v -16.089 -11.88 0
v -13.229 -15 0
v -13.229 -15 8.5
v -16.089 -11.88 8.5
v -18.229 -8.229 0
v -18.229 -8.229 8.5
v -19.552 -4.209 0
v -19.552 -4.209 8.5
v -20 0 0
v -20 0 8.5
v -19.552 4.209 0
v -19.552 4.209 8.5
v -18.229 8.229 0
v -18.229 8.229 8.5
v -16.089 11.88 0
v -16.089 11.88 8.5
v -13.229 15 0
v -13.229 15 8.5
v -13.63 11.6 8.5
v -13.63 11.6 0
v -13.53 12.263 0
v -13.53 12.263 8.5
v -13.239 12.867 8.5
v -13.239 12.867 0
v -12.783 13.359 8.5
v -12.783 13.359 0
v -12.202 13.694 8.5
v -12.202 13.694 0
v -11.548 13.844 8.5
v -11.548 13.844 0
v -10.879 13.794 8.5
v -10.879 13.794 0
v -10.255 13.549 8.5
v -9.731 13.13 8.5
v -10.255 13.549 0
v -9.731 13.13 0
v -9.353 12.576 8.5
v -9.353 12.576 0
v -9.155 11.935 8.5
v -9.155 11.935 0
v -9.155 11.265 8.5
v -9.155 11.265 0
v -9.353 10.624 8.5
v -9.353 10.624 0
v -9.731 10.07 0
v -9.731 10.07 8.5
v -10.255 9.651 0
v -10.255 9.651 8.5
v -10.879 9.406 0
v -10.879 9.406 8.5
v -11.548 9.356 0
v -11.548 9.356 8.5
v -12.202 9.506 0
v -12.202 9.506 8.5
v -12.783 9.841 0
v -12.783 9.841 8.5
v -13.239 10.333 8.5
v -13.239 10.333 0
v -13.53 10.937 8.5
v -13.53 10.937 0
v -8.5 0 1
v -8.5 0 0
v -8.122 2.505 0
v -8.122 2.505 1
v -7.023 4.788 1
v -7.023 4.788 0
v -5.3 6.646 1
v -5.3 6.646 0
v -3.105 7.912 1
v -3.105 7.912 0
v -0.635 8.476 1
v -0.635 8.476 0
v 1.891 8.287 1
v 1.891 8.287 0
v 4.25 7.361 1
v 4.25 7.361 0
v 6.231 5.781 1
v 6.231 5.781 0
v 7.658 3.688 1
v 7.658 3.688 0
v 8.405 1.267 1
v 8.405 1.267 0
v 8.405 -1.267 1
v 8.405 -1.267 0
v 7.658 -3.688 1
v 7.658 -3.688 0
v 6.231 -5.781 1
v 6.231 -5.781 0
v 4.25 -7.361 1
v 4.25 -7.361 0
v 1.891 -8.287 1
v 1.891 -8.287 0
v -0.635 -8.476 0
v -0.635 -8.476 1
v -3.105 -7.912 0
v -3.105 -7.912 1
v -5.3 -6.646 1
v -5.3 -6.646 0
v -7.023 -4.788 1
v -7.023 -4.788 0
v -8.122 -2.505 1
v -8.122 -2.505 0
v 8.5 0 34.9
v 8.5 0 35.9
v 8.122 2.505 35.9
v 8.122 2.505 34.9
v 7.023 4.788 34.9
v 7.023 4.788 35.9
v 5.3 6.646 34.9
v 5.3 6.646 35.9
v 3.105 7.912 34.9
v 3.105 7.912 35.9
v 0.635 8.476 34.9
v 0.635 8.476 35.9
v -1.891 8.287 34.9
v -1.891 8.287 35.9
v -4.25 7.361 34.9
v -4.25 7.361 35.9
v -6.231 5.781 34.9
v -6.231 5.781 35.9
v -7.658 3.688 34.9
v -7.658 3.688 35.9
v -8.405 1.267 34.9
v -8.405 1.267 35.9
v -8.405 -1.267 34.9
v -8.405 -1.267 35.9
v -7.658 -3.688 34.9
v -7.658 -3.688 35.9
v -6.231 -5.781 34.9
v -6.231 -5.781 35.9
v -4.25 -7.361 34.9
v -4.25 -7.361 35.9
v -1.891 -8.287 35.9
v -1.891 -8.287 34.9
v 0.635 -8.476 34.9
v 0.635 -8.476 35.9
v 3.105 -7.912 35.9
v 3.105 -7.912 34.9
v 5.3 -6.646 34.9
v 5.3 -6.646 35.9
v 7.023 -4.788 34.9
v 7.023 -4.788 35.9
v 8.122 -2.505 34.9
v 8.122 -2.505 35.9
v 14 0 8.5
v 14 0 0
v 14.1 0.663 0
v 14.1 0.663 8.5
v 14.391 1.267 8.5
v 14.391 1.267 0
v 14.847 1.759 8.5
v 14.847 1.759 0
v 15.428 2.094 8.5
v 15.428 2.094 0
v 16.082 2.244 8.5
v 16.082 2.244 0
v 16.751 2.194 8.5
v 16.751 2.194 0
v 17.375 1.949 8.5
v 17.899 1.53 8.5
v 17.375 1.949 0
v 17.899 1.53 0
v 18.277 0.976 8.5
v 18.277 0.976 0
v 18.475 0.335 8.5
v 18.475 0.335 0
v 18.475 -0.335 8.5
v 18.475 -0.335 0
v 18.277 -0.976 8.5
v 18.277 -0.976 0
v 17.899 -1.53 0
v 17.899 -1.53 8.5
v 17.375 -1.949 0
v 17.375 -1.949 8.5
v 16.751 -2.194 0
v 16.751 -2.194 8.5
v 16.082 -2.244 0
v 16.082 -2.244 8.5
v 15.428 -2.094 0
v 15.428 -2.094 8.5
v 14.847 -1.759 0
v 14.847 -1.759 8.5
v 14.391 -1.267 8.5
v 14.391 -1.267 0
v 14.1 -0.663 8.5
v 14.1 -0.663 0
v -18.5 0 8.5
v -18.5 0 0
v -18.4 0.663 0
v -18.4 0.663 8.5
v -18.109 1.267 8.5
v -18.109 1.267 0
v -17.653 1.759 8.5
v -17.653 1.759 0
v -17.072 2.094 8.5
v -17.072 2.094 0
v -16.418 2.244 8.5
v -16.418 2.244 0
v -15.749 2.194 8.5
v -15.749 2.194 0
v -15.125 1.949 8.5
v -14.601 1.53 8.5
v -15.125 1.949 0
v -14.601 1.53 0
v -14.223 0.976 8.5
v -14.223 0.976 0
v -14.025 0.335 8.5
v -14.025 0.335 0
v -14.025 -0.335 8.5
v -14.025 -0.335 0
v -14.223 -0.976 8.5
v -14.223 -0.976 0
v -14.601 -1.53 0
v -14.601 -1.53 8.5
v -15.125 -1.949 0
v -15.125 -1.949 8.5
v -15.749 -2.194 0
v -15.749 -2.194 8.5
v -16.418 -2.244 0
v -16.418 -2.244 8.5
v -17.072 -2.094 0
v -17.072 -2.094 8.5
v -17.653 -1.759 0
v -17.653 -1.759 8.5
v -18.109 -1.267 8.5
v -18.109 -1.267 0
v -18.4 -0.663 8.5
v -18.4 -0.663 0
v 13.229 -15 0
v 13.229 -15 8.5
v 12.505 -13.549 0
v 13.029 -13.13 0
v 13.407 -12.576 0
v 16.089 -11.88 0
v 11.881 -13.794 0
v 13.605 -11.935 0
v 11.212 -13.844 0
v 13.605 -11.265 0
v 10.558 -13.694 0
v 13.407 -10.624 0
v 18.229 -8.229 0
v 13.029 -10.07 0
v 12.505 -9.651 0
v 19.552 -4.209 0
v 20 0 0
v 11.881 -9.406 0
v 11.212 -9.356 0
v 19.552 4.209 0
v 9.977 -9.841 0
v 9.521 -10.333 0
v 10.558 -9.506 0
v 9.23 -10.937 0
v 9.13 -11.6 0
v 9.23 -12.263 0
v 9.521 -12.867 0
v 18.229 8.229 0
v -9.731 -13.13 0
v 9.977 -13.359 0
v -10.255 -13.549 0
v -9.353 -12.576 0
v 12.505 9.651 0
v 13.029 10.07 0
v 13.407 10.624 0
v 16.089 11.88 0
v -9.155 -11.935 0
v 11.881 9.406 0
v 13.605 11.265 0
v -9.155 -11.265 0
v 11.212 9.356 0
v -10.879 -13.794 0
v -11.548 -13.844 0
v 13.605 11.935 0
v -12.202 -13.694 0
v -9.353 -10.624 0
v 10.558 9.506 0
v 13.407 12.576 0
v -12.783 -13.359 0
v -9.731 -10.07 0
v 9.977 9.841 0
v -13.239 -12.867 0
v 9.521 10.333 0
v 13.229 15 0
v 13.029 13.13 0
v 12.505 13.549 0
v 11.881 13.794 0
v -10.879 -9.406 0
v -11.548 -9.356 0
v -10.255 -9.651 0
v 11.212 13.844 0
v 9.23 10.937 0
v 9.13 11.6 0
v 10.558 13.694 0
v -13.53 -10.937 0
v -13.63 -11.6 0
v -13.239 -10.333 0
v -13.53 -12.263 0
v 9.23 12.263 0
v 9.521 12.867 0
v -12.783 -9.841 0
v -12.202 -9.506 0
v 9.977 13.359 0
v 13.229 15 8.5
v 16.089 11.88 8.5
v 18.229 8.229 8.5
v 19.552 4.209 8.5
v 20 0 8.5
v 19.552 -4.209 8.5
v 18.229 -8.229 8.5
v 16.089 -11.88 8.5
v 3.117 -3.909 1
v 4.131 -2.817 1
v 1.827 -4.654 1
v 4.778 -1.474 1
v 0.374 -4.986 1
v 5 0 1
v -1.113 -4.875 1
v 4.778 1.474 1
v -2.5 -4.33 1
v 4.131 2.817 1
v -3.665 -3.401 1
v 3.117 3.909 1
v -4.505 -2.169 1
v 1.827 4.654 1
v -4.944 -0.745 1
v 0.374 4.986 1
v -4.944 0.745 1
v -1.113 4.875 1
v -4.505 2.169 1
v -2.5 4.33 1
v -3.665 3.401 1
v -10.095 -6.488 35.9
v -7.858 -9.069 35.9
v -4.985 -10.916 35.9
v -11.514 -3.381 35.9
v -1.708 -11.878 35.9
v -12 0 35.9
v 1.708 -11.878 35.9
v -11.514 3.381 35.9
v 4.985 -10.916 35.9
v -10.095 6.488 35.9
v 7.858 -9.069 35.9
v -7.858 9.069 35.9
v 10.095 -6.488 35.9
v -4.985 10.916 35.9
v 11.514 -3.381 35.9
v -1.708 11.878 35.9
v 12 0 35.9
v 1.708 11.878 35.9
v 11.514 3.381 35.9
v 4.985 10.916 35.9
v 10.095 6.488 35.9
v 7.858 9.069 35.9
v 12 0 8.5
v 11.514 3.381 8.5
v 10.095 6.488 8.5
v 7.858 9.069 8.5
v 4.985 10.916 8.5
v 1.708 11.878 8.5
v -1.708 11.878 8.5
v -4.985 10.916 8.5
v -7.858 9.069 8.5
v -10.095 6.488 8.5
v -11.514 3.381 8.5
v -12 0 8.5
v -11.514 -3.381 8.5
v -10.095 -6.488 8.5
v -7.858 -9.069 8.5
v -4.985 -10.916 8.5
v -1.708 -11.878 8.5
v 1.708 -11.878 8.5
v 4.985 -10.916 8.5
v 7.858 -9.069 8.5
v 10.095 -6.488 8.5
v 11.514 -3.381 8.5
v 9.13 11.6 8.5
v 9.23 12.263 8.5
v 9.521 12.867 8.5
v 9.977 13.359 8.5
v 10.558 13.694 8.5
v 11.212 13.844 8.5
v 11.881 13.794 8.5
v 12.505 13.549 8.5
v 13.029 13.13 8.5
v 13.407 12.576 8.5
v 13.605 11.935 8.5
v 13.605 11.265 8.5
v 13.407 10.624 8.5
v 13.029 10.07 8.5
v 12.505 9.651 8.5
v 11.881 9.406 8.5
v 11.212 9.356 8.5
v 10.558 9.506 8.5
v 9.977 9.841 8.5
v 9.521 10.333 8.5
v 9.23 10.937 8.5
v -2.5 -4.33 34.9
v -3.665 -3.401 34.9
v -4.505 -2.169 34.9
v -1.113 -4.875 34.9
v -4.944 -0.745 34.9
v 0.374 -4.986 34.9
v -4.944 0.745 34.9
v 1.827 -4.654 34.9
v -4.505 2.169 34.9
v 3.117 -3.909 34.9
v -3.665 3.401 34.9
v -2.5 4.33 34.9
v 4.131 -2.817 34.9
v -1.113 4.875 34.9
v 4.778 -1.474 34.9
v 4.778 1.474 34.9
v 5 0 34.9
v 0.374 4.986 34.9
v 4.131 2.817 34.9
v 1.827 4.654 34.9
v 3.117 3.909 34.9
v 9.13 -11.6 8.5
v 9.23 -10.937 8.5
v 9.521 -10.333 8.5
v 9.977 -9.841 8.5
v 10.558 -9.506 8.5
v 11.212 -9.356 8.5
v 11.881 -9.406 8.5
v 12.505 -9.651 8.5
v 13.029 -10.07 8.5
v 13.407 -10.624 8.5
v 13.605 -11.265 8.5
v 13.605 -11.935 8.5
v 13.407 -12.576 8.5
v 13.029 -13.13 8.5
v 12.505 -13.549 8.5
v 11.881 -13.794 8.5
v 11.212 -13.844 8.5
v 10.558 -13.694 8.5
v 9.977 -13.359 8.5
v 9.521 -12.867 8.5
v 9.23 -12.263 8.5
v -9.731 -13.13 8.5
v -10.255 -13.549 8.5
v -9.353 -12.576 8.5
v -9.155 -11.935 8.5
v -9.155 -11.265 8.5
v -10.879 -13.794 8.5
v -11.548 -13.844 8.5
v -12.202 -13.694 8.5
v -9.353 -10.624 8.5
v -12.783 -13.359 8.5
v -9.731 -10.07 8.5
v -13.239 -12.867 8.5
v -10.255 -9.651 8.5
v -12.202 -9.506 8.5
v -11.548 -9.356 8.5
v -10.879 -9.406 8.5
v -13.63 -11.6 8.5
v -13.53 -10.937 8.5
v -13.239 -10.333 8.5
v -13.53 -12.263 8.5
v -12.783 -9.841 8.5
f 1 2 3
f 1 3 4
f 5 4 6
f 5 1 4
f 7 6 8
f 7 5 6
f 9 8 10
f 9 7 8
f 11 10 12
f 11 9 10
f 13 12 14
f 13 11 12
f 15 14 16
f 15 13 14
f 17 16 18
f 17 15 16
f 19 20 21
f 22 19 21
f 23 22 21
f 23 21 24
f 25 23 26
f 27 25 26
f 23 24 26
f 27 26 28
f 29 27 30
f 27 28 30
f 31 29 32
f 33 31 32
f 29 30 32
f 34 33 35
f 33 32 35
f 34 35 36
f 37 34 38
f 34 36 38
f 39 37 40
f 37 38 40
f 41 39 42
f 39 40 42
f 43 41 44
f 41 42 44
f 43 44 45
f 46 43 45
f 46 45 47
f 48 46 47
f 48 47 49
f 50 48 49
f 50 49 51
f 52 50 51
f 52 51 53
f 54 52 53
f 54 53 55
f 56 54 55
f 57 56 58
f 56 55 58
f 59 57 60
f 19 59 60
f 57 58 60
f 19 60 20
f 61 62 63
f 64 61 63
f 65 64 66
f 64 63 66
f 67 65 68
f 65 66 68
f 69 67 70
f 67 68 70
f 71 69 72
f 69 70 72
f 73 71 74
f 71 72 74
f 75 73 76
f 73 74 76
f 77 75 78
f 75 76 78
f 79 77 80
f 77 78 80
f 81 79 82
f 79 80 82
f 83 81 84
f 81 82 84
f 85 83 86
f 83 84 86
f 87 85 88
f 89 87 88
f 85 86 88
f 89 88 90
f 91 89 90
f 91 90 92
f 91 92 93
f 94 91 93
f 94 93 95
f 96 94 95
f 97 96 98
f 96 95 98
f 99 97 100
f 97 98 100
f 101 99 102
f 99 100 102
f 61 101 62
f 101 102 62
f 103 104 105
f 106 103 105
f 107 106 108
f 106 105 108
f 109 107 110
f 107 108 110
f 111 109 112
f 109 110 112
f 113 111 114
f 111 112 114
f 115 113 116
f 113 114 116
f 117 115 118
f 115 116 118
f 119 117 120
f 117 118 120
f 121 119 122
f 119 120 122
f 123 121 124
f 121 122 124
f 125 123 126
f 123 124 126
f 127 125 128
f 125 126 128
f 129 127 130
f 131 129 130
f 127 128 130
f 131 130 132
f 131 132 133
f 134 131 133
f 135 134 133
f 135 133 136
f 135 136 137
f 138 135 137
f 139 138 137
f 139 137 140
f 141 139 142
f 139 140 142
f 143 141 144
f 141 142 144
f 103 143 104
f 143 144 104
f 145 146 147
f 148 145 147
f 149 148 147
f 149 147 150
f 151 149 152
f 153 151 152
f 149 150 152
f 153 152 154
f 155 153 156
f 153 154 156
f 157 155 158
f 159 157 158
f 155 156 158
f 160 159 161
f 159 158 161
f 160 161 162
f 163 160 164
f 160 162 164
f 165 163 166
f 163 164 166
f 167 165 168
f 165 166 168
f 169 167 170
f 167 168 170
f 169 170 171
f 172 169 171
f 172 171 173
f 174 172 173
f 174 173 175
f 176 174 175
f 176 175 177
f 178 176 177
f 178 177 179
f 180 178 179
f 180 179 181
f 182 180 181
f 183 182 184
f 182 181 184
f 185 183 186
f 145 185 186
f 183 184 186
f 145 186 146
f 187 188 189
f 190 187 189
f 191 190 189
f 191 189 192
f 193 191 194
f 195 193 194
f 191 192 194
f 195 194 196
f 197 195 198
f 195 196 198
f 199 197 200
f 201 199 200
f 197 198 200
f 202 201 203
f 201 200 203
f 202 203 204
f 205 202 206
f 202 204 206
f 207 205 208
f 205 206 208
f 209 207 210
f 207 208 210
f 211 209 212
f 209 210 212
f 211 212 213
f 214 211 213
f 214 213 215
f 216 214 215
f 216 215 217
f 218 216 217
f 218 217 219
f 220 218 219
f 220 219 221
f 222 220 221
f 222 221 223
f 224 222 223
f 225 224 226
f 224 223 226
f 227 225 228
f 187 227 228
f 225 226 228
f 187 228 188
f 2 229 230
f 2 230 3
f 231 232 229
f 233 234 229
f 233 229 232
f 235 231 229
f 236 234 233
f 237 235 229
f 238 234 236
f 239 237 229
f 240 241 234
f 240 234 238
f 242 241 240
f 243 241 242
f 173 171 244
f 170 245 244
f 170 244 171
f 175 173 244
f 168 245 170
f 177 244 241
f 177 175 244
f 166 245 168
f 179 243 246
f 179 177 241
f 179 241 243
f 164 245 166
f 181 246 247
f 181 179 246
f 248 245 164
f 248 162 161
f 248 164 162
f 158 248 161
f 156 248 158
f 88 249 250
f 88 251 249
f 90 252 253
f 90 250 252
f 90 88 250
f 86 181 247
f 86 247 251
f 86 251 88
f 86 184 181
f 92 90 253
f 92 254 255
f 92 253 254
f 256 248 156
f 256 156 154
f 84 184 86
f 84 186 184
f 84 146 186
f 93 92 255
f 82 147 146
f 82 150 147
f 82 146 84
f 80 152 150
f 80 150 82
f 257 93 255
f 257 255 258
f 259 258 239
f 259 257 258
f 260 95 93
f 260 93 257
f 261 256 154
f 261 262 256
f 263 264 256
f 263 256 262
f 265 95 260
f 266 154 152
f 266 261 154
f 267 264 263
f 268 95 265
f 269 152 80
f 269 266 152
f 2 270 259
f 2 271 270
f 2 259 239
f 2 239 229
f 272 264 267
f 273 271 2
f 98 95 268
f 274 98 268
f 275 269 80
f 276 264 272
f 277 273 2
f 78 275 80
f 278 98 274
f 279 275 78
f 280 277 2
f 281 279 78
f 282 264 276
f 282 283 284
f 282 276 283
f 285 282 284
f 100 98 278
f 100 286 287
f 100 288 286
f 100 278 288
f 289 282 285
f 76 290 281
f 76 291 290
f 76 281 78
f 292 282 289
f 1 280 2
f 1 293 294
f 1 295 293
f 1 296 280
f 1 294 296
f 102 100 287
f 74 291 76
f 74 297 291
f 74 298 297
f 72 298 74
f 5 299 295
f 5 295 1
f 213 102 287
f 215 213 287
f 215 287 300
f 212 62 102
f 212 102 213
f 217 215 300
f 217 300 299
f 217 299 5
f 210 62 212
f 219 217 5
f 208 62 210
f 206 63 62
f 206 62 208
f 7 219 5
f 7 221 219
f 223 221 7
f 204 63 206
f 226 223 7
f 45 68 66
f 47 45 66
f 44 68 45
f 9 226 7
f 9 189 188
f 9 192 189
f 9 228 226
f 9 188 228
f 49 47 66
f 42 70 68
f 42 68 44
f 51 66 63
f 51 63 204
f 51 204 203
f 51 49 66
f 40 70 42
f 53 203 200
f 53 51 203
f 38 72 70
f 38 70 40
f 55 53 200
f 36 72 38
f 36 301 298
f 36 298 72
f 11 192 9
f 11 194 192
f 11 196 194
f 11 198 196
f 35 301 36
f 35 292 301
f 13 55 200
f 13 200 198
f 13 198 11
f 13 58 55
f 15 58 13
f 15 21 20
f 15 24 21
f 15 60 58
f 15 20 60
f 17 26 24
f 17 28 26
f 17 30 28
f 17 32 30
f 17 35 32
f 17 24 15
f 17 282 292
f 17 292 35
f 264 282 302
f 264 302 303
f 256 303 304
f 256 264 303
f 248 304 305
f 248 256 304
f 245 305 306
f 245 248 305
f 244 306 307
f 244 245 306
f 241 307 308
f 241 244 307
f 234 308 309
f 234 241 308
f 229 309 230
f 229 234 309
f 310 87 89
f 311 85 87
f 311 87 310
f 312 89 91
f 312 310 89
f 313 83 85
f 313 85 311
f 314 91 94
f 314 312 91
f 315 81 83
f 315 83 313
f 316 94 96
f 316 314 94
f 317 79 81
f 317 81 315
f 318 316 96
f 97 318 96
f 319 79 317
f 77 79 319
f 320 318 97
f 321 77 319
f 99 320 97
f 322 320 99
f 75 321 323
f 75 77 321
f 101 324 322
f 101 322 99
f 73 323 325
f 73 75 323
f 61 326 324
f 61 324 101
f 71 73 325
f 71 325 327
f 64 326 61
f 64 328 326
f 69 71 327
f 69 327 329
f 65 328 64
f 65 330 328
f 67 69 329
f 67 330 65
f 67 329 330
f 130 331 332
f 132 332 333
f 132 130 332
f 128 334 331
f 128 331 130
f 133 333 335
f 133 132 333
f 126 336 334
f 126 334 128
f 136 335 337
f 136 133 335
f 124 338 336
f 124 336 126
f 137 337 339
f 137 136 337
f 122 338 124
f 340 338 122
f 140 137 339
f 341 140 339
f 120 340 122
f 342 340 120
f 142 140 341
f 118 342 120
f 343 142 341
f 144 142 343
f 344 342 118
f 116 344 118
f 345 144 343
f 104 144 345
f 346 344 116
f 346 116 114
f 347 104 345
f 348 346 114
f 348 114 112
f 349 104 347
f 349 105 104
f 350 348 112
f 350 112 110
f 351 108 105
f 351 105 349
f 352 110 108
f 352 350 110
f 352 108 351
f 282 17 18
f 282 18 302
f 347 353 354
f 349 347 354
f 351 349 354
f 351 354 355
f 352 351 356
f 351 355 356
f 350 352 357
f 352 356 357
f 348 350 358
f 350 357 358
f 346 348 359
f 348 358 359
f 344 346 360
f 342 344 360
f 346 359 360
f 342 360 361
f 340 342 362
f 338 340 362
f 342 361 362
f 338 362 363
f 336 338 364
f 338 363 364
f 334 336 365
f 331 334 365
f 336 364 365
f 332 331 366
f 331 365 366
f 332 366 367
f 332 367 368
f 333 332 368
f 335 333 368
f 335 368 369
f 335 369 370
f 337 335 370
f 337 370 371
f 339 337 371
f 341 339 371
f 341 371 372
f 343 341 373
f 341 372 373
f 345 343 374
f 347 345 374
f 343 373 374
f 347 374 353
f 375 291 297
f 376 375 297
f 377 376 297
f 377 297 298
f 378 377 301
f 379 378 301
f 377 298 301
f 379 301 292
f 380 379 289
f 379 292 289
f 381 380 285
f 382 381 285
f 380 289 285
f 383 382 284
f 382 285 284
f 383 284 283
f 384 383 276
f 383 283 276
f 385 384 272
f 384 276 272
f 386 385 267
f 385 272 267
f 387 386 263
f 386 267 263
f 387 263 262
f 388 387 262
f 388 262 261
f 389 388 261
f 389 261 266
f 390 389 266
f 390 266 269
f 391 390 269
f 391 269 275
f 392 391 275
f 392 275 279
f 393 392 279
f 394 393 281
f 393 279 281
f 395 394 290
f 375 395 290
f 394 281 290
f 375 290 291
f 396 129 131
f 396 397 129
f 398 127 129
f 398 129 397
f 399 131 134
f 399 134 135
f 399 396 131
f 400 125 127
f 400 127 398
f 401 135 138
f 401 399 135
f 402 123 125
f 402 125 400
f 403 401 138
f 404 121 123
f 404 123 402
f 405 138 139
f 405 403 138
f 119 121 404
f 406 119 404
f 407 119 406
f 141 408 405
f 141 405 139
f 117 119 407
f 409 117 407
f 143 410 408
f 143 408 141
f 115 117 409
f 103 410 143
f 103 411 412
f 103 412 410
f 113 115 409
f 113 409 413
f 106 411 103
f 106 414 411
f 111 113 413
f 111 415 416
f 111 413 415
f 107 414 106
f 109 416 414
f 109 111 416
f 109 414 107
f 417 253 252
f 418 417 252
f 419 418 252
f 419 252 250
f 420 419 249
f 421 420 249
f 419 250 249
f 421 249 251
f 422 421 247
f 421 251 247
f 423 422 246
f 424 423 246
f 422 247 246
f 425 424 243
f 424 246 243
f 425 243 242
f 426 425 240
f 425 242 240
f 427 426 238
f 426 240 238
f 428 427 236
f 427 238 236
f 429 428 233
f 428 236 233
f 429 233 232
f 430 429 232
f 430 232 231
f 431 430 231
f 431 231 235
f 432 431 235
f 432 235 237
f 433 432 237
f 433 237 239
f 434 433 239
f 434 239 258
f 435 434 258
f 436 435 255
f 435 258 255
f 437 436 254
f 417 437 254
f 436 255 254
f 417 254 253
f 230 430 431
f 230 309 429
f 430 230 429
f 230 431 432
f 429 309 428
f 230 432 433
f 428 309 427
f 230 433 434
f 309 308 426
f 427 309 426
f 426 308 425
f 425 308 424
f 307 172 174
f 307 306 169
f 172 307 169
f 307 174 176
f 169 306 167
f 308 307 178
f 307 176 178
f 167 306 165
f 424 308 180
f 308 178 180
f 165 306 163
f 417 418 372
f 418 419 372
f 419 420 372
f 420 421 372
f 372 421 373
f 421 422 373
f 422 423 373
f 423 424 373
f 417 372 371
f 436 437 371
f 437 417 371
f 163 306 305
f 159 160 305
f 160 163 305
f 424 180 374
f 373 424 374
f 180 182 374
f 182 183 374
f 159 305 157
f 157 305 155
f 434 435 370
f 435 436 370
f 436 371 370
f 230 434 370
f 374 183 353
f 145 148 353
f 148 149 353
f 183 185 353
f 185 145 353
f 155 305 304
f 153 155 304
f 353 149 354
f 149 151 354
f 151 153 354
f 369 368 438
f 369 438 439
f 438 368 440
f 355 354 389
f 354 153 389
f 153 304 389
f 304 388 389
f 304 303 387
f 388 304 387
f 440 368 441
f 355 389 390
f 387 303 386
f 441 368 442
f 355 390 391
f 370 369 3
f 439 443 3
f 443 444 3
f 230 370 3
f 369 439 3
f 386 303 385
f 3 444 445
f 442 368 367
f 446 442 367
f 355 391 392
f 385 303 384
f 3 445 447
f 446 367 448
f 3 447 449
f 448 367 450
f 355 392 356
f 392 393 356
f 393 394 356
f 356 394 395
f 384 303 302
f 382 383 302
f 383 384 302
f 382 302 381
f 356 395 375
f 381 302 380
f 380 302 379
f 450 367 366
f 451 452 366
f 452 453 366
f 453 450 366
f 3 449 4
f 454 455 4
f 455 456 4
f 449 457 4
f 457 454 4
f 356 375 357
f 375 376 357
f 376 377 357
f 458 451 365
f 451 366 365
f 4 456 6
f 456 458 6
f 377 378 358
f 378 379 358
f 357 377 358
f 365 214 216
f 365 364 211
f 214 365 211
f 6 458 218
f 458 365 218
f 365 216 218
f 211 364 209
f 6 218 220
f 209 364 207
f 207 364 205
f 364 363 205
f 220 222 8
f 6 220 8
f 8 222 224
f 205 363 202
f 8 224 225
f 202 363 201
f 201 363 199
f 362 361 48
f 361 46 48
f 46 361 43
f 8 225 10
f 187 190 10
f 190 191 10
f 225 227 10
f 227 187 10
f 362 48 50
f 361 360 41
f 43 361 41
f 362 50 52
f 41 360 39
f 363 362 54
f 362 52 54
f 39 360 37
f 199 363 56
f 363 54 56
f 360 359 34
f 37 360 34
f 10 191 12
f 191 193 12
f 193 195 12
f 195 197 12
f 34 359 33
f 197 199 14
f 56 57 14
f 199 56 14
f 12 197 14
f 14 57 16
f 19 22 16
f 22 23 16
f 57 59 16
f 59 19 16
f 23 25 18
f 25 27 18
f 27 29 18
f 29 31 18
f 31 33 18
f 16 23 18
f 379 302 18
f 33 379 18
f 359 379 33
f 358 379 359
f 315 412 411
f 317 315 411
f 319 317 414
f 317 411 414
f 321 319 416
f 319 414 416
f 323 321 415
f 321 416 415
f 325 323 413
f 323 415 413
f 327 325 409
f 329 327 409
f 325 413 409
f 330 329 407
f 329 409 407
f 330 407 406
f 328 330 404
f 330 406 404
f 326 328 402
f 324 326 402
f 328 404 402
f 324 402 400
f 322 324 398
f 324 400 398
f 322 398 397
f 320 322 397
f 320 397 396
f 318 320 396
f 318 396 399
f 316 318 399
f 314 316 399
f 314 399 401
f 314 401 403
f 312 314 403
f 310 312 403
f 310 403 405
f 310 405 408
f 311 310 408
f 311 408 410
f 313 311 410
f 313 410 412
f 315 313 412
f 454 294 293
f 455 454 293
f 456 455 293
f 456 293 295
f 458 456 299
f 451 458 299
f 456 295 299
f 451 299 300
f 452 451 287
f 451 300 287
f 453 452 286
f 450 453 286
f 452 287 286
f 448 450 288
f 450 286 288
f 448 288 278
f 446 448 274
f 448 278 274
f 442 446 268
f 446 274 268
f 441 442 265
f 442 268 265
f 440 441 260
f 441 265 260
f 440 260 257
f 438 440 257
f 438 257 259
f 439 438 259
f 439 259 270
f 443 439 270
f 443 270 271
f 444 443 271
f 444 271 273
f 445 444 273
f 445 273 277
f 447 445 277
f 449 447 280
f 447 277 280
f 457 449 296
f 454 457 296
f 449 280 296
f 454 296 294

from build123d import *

# Parameters (mm, degrees)
SALIENTE_EXTRUIR1_DEPTH = 8.5
CROQUIS2_R              = 12
SALIENTE_EXTRUIR2_DEPTH = 27.4
CROQUIS3_R              = 5
CORTAR_EXTRUIR1_DEPTH   = 35.9
CROQUIS4_R              = 8.5
CORTAR_EXTRUIR2_DEPTH   = 1
CROQUIS5_R              = 8.5
CORTAR_EXTRUIR3_DEPTH   = 1
CROQUIS6_R              = 2.25
CORTAR_EXTRUIR4_DEPTH   = 8.5


with BuildPart() as part:
    # Croquis1 → Saliente-Extruir1 (new body)
    with BuildSketch(Plane.XY):
        with BuildLine():
            Line((-13.228756555, 15), (13.228756555, 15))
            ThreePointArc((13.228756555, 15), (20, 0), (13.228756555, -15))
            Line((13.228756555, -15), (-13.228756555, -15))
            ThreePointArc((-13.228756555, -15), (-20, 0), (-13.228756555, 15))
        make_face()
    extrude(amount=SALIENTE_EXTRUIR1_DEPTH)

    # Croquis2 → Saliente-Extruir2 (add)
    with BuildSketch(Plane.XY.offset(8.5)):
        Circle(CROQUIS2_R)
    extrude(amount=SALIENTE_EXTRUIR2_DEPTH)

    # Croquis3 → Cortar-Extruir1 (cut)
    with BuildSketch(Plane.XY.offset(35.9)):
        Circle(CROQUIS3_R)
    extrude(amount=-CORTAR_EXTRUIR1_DEPTH, mode=Mode.SUBTRACT)

    # Croquis4 → Cortar-Extruir2 (cut)
    with BuildSketch(Plane.XY.offset(35.9)):
        Circle(CROQUIS4_R)
    extrude(amount=-CORTAR_EXTRUIR2_DEPTH, mode=Mode.SUBTRACT)

    # Croquis5 → Cortar-Extruir3 (cut)
    with BuildSketch(Plane(origin=(0, 0, 0), x_dir=(-1, 0, 0), z_dir=(0, 0, -1))):
        Circle(CROQUIS5_R)
    extrude(amount=-CORTAR_EXTRUIR3_DEPTH, mode=Mode.SUBTRACT)

    # Croquis6 → Cortar-Extruir4 (cut)
    with BuildSketch(Plane(origin=(0, 0, 0), x_dir=(-1, 0, 0), z_dir=(0, 0, -1))):
        with Locations((11.37991652, -11.6)):
            Circle(CROQUIS6_R)
        with Locations((16.25, 0)):
            Circle(CROQUIS6_R)
        with Locations((11.37991652, 11.6)):
            Circle(CROQUIS6_R)
        with Locations((-11.37991652, -11.6)):
            Circle(CROQUIS6_R)
        with Locations((-16.25, 0)):
            Circle(CROQUIS6_R)
        with Locations((-11.37991652, 11.6)):
            Circle(CROQUIS6_R)
    extrude(amount=-CORTAR_EXTRUIR4_DEPTH, mode=Mode.SUBTRACT)


solid = part.part
